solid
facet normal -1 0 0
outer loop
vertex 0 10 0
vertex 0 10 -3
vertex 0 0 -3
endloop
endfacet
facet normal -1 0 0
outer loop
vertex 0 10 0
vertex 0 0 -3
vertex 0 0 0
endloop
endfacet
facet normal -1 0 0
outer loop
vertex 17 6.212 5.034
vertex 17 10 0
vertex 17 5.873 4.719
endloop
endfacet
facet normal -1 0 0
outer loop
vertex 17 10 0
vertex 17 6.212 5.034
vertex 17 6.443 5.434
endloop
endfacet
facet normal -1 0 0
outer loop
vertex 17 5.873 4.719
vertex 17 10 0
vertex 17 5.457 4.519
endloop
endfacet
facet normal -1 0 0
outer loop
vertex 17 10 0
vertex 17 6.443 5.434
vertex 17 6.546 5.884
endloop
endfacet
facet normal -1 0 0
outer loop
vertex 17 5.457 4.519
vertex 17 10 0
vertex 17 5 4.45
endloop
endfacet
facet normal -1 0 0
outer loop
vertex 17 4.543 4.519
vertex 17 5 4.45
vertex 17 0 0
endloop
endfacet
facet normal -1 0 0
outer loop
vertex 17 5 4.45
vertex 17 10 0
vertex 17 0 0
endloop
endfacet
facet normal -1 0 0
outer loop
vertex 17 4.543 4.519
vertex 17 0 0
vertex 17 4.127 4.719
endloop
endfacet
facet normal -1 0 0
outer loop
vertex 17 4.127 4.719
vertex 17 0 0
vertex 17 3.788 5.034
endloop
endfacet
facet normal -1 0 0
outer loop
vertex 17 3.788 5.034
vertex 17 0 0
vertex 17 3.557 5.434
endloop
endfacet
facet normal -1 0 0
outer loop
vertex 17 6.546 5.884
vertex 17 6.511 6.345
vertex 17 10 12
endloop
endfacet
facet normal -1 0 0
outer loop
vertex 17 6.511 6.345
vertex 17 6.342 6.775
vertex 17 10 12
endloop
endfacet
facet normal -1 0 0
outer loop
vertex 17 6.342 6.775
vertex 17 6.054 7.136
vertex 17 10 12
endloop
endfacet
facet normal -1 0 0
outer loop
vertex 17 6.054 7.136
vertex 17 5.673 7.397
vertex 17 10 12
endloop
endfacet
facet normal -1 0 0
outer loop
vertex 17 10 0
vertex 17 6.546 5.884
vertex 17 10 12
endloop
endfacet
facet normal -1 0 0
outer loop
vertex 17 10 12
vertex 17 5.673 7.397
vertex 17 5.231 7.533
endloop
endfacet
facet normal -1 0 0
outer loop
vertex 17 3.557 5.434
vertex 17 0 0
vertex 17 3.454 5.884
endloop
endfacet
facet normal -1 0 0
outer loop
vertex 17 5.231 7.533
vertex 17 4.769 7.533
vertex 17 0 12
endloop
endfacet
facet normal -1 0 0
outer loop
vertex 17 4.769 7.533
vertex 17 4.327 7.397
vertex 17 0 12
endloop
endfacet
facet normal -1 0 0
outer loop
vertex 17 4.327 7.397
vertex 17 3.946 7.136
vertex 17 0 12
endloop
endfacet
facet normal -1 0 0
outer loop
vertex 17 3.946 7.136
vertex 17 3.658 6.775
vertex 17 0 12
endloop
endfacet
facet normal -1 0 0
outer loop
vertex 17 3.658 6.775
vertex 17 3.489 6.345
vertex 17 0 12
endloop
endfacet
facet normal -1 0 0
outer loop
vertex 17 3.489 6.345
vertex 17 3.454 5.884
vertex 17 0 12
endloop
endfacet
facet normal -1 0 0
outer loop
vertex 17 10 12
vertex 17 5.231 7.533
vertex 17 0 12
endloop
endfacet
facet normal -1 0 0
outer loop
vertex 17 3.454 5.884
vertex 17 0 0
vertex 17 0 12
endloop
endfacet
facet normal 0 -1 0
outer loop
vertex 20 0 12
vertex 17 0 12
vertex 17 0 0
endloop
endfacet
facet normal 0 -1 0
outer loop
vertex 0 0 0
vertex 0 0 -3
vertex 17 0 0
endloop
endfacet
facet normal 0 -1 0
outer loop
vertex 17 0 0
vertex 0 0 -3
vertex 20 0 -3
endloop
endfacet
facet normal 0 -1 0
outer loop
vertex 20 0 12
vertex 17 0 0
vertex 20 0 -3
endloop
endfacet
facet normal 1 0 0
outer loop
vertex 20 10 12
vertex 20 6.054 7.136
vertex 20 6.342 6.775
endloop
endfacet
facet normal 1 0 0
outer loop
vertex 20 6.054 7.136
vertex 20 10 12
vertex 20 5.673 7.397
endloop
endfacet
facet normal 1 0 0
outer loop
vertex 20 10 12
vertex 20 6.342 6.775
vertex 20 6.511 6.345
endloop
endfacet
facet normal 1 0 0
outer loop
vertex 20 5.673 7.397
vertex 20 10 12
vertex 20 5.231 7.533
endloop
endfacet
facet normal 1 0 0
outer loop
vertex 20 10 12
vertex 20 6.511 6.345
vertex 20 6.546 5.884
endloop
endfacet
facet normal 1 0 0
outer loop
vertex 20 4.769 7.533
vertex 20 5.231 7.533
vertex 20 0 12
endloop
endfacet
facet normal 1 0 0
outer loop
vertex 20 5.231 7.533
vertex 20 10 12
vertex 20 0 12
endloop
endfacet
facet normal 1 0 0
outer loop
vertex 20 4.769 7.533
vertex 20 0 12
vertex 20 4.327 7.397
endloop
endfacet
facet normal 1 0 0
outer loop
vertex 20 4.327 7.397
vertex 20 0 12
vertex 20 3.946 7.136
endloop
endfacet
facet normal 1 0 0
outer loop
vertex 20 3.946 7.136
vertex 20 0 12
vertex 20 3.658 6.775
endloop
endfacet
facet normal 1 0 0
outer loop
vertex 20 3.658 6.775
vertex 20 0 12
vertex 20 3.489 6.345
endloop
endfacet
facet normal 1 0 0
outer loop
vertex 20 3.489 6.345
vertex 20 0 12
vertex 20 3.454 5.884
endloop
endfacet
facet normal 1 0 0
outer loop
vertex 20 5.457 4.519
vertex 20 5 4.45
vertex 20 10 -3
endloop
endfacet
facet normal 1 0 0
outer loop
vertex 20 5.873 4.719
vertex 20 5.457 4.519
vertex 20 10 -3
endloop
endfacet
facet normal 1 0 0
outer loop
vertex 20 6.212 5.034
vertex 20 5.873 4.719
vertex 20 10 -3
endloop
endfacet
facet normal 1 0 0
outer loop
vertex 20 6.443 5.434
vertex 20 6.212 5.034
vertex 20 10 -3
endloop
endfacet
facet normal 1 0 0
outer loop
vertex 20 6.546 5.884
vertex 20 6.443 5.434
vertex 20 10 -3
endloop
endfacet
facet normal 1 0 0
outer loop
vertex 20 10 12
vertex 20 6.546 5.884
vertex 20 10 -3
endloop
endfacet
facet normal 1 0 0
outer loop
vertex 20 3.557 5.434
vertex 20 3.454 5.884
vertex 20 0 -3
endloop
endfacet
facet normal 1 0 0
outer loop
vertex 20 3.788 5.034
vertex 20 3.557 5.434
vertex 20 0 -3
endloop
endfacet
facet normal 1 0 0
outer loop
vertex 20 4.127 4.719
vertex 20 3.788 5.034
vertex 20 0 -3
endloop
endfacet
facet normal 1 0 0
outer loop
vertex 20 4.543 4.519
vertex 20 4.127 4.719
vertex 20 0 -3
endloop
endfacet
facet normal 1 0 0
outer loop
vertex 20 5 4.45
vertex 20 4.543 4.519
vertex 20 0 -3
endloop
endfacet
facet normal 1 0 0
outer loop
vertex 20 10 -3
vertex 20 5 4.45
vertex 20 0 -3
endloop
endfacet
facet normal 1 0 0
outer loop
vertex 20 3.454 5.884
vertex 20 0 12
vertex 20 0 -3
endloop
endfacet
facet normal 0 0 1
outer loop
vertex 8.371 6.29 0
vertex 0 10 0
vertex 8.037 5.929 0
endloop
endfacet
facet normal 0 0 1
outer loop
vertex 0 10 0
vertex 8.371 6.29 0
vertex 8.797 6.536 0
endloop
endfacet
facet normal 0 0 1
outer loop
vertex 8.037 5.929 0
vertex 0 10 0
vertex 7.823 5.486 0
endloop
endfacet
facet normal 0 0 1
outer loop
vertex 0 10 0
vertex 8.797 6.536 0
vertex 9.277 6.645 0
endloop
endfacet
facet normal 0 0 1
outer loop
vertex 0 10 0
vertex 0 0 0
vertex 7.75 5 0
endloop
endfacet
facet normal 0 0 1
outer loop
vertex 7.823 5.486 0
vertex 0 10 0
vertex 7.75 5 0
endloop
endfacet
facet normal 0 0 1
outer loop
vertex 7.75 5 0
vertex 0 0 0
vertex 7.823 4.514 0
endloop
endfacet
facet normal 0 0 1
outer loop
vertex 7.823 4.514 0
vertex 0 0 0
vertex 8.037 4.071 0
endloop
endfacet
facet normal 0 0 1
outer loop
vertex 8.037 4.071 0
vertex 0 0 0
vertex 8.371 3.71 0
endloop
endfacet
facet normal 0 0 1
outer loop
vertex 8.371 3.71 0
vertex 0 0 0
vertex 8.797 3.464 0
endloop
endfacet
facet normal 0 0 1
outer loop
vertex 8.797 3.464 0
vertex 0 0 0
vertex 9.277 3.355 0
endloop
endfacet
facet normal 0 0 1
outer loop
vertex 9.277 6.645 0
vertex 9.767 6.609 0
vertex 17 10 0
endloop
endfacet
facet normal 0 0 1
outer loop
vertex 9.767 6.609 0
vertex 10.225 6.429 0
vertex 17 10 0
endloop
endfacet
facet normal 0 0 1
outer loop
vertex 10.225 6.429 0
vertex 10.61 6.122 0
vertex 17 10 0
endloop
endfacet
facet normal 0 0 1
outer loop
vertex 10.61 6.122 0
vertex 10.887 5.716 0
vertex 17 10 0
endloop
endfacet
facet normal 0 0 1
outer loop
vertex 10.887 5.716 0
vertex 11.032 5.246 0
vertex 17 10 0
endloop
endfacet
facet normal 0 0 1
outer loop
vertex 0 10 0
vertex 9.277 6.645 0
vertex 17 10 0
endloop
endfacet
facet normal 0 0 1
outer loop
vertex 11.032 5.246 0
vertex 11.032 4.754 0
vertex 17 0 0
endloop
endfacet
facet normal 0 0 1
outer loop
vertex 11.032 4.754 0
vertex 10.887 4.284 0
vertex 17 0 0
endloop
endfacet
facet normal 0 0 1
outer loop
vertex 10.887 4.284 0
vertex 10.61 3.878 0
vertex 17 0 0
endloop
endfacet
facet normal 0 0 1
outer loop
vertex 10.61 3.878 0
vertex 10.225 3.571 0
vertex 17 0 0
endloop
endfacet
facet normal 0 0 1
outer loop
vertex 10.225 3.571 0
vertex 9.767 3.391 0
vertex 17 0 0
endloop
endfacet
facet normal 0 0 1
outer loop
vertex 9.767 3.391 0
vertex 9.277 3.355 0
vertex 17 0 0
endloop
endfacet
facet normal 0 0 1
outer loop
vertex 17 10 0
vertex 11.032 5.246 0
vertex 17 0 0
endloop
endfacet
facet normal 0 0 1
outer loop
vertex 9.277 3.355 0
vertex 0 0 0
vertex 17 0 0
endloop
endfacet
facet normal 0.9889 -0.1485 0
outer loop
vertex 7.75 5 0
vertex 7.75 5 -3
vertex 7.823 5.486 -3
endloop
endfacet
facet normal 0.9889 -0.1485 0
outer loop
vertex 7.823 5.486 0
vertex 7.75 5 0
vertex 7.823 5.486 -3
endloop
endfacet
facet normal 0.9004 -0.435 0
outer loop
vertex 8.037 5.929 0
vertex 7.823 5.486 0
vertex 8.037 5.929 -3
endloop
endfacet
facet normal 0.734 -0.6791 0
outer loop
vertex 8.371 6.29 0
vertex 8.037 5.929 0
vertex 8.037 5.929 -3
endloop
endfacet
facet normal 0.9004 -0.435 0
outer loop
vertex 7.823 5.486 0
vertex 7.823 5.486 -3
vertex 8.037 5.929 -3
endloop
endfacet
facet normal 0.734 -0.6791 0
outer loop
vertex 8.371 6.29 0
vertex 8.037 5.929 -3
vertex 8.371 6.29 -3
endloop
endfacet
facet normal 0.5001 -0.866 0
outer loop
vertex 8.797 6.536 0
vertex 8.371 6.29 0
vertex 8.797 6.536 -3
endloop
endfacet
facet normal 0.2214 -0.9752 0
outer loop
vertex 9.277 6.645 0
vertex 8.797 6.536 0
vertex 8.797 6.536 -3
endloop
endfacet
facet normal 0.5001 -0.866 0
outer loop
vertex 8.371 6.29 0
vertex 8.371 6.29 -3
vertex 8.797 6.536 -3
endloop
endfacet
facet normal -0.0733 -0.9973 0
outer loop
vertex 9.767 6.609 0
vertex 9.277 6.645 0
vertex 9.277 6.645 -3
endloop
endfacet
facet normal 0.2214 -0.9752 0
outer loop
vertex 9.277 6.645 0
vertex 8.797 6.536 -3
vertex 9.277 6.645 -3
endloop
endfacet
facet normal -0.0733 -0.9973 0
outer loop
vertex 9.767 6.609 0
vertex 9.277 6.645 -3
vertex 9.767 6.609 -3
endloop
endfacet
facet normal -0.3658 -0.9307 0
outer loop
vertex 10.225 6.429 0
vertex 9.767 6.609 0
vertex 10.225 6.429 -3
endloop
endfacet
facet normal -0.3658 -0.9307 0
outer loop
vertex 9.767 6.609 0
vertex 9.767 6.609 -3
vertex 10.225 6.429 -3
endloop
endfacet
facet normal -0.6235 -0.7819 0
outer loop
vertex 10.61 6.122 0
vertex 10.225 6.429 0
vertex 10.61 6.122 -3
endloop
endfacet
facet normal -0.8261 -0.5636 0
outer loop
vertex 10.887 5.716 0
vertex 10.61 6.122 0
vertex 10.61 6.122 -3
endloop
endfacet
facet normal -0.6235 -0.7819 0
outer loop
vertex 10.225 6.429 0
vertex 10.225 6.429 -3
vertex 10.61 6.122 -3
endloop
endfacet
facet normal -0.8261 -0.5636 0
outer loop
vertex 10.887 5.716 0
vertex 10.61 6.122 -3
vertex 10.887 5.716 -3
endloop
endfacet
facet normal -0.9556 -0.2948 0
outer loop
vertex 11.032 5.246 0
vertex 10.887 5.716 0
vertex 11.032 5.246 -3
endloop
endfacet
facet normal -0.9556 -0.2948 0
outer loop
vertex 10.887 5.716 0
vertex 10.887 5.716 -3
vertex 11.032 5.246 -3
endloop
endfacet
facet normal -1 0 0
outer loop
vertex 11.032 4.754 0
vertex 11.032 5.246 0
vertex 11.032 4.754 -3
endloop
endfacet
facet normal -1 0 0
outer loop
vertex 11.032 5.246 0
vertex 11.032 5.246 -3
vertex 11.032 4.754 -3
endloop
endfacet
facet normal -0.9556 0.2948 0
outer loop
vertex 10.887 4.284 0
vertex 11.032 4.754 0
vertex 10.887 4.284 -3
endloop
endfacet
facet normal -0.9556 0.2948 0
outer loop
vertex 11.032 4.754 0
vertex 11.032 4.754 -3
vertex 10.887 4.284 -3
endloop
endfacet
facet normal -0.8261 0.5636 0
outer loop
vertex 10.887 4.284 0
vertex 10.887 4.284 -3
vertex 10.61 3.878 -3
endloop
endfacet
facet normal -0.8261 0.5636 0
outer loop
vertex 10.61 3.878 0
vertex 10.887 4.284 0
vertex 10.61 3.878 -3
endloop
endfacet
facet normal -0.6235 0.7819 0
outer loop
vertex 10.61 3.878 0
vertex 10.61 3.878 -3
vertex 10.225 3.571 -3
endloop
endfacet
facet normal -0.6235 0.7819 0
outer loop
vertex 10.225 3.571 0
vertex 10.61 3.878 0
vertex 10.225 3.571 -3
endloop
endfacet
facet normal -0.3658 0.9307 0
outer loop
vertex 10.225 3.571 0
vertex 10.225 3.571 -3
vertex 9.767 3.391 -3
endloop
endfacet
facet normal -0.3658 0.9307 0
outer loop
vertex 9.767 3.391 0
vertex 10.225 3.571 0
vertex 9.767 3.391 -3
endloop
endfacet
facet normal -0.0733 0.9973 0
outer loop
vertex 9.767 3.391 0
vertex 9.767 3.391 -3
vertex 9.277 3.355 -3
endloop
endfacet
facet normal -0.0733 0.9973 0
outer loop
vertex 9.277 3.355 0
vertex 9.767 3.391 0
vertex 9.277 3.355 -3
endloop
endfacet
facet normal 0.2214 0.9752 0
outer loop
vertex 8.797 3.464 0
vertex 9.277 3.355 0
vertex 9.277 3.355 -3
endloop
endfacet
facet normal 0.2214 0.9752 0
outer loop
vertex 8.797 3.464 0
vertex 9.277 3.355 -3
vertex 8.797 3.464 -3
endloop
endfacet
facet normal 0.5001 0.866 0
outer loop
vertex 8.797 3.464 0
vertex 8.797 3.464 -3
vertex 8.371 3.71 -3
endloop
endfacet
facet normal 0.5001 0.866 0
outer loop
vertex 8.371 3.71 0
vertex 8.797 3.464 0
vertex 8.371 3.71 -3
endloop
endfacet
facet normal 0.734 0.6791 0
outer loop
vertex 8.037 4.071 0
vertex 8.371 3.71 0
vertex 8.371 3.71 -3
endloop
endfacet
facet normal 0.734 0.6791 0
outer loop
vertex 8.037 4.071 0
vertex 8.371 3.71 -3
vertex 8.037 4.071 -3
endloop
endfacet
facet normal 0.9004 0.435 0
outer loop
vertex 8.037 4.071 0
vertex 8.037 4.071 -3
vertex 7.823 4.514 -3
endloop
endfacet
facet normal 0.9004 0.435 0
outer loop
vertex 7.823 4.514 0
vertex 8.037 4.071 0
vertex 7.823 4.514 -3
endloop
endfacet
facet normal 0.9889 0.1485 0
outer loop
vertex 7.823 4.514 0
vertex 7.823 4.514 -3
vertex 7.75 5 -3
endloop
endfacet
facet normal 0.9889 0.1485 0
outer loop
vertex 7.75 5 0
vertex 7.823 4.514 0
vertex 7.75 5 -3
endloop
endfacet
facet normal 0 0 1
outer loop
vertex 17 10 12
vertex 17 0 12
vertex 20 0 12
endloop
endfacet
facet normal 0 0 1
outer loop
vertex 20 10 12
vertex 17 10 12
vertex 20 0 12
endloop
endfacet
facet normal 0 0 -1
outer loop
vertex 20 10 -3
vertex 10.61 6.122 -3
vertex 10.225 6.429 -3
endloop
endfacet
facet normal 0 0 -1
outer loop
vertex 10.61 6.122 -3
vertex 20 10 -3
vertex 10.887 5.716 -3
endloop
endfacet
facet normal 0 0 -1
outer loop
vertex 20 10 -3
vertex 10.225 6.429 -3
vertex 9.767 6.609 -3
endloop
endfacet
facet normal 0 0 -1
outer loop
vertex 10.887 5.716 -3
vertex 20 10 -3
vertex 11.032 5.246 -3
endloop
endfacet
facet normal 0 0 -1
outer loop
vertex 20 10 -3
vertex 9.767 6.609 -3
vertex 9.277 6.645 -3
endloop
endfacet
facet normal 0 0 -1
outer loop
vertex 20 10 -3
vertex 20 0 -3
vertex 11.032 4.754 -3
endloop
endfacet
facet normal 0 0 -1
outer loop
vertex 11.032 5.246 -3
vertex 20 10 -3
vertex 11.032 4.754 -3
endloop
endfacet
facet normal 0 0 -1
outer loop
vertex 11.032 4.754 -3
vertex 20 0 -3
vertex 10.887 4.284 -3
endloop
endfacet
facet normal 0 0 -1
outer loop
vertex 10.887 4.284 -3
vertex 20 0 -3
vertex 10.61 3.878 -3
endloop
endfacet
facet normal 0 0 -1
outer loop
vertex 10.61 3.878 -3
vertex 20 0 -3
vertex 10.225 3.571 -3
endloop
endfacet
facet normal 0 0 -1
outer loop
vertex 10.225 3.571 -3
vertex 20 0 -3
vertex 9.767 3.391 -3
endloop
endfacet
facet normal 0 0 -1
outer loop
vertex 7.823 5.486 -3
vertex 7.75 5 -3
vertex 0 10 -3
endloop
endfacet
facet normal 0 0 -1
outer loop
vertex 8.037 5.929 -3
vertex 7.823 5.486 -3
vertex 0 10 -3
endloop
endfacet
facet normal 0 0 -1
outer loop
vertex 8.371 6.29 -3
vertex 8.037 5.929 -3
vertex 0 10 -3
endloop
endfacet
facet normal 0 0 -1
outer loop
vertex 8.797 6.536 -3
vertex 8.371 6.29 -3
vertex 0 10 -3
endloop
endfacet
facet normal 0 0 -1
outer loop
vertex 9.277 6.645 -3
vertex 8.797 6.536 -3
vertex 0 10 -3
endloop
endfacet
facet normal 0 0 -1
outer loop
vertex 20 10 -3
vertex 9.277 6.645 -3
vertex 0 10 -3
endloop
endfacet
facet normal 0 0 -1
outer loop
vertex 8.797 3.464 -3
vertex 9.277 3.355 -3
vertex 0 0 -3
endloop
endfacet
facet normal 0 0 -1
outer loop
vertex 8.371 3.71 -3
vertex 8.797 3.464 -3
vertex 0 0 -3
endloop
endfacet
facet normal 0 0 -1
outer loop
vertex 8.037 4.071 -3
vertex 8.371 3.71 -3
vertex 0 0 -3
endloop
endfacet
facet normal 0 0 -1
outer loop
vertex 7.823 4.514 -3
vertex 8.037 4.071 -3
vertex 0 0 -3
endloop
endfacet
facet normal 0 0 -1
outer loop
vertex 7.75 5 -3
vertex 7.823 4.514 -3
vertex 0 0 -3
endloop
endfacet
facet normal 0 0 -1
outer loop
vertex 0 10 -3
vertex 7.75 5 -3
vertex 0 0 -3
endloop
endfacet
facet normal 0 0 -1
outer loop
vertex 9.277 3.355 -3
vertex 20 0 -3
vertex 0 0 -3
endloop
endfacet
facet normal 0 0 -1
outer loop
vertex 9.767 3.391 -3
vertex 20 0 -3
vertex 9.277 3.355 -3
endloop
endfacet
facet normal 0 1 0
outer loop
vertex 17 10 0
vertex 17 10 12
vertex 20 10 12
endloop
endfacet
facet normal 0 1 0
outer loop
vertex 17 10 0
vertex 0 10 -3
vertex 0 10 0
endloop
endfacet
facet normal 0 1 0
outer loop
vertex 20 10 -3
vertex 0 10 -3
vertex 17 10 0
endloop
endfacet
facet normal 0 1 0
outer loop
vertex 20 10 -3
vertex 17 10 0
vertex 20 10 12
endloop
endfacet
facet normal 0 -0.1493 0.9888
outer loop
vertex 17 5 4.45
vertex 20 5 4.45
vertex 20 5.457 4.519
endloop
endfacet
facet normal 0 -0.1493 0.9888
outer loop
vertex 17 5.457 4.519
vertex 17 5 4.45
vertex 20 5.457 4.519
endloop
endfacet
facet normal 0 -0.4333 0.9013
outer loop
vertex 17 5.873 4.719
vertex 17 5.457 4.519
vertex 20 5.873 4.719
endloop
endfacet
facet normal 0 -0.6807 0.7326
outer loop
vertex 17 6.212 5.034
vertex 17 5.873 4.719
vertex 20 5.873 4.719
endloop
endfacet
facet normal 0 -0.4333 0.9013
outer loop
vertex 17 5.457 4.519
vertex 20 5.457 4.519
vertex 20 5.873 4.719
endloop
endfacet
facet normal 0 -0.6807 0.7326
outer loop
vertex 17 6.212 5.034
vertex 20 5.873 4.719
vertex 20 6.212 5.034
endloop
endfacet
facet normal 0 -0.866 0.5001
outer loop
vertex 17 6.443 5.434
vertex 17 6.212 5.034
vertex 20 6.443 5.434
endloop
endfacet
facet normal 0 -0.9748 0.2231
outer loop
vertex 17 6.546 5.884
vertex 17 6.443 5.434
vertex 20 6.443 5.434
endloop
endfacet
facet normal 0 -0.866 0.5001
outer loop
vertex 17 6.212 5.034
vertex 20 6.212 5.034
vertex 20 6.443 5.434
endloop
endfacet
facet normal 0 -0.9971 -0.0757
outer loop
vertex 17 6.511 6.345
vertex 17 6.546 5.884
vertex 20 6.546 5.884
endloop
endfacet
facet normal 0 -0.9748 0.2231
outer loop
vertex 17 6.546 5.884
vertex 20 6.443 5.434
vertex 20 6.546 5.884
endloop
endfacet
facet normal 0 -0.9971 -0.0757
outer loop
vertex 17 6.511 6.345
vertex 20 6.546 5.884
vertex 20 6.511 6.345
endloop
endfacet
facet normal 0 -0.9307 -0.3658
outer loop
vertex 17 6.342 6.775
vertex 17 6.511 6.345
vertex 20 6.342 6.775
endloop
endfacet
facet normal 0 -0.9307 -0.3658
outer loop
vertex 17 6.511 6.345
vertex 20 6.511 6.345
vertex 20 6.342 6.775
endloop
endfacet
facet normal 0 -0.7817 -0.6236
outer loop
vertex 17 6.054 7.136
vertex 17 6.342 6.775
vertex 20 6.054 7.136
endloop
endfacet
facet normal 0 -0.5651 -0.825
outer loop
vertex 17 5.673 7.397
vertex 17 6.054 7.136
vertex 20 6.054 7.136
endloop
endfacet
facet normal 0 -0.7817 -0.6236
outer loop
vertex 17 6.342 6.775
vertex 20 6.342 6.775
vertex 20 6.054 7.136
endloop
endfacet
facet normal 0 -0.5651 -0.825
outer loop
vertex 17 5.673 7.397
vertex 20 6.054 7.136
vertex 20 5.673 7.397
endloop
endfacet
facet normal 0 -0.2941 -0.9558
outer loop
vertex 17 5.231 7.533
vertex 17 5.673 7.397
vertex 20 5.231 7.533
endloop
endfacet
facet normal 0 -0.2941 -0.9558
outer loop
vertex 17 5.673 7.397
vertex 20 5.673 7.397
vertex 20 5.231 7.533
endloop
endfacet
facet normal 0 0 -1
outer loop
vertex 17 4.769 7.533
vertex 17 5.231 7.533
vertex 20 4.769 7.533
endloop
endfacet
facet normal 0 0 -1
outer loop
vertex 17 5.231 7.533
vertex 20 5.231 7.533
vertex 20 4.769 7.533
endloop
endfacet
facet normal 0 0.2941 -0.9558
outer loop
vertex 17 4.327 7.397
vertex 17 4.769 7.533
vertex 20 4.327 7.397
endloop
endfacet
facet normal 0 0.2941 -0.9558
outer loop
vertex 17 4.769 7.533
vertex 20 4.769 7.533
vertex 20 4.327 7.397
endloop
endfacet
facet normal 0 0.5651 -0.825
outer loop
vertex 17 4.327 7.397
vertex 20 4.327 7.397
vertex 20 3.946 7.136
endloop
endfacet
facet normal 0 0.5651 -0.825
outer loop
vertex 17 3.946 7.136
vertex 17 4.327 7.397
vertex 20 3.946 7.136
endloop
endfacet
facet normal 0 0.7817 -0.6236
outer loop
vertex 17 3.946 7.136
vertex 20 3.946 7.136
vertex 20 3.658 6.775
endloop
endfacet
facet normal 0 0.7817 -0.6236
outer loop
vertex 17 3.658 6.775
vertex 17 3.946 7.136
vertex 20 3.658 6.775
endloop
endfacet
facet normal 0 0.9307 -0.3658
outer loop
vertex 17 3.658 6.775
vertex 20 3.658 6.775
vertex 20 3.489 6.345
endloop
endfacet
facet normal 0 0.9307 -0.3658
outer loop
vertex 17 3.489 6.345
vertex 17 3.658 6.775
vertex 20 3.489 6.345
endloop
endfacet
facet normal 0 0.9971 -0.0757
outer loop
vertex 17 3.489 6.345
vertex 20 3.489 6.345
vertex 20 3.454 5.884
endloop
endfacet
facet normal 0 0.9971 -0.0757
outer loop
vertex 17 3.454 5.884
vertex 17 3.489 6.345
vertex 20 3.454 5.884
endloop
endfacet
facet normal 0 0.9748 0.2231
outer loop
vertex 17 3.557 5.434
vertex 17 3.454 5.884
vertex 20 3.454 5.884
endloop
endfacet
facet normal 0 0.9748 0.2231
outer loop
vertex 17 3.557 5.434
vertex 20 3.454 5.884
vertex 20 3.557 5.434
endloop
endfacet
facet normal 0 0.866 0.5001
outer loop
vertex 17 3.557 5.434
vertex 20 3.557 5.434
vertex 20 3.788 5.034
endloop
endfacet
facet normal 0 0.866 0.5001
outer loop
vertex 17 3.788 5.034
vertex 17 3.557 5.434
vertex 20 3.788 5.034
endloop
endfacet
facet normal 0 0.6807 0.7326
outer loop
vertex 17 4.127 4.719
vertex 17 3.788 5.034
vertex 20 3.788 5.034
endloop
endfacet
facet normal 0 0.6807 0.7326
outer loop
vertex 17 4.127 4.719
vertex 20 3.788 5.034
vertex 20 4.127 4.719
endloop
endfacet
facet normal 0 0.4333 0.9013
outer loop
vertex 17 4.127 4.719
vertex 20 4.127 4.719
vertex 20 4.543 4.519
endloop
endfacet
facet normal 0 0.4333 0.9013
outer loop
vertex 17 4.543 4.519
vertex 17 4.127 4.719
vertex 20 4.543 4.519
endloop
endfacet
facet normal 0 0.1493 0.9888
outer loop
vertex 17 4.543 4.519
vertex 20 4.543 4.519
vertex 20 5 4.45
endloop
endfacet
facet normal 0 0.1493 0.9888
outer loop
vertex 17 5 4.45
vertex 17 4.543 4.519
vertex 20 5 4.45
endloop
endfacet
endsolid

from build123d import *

# Parameters (mm, degrees)
BOSS_EXTRUDE1_DEPTH = 10
CUT_EXTRUDE1_REACH  = 22
SKETCH2_R           = 1.55
CUT_EXTRUDE2_REACH  = 17
SKETCH3_R           = 1.65


with BuildPart() as part:
    # Sketch1 → Boss-Extrude1 (new body)
    with BuildSketch(Plane(origin=(0, 0, 0), x_dir=(1, 0, 0), z_dir=(0, 1, 0))):
        Polygon((0, 0), (17, 0), (17, -12), (20, -12), (20, 3), (0, 3), align=None)
    extrude(amount=BOSS_EXTRUDE1_DEPTH)

    # Sketch2 → Cut-Extrude1 (cut, up to next)
    with BuildSketch(Plane(origin=(20, 0, 0), x_dir=(0, 0, -1), z_dir=(1, 0, 0)), mode=Mode.PRIVATE) as cut_extrude1_sk1:
        with Locations((-6, 5)):
            Circle(SKETCH2_R)
    cut_extrude1_tool1 = extrude(cut_extrude1_sk1.sketch, amount=-CUT_EXTRUDE1_REACH, mode=Mode.PRIVATE) & part.part
    add(cut_extrude1_tool1.solids().sort_by_distance((20, 5, 6))[0], mode=Mode.SUBTRACT)

    # Sketch3 → Cut-Extrude2 (cut, up to next)
    with BuildSketch(Plane(origin=(0, 0, -3), x_dir=(-1, 0, 0), z_dir=(0, 0, -1)), mode=Mode.PRIVATE) as cut_extrude2_sk1:
        with Locations((-9.4, 5)):
            Circle(SKETCH3_R)
    cut_extrude2_tool1 = extrude(cut_extrude2_sk1.sketch, amount=-CUT_EXTRUDE2_REACH, mode=Mode.PRIVATE) & part.part
    add(cut_extrude2_tool1.solids().sort_by_distance((9.4, 5, -3))[0], mode=Mode.SUBTRACT)


solid = part.part
